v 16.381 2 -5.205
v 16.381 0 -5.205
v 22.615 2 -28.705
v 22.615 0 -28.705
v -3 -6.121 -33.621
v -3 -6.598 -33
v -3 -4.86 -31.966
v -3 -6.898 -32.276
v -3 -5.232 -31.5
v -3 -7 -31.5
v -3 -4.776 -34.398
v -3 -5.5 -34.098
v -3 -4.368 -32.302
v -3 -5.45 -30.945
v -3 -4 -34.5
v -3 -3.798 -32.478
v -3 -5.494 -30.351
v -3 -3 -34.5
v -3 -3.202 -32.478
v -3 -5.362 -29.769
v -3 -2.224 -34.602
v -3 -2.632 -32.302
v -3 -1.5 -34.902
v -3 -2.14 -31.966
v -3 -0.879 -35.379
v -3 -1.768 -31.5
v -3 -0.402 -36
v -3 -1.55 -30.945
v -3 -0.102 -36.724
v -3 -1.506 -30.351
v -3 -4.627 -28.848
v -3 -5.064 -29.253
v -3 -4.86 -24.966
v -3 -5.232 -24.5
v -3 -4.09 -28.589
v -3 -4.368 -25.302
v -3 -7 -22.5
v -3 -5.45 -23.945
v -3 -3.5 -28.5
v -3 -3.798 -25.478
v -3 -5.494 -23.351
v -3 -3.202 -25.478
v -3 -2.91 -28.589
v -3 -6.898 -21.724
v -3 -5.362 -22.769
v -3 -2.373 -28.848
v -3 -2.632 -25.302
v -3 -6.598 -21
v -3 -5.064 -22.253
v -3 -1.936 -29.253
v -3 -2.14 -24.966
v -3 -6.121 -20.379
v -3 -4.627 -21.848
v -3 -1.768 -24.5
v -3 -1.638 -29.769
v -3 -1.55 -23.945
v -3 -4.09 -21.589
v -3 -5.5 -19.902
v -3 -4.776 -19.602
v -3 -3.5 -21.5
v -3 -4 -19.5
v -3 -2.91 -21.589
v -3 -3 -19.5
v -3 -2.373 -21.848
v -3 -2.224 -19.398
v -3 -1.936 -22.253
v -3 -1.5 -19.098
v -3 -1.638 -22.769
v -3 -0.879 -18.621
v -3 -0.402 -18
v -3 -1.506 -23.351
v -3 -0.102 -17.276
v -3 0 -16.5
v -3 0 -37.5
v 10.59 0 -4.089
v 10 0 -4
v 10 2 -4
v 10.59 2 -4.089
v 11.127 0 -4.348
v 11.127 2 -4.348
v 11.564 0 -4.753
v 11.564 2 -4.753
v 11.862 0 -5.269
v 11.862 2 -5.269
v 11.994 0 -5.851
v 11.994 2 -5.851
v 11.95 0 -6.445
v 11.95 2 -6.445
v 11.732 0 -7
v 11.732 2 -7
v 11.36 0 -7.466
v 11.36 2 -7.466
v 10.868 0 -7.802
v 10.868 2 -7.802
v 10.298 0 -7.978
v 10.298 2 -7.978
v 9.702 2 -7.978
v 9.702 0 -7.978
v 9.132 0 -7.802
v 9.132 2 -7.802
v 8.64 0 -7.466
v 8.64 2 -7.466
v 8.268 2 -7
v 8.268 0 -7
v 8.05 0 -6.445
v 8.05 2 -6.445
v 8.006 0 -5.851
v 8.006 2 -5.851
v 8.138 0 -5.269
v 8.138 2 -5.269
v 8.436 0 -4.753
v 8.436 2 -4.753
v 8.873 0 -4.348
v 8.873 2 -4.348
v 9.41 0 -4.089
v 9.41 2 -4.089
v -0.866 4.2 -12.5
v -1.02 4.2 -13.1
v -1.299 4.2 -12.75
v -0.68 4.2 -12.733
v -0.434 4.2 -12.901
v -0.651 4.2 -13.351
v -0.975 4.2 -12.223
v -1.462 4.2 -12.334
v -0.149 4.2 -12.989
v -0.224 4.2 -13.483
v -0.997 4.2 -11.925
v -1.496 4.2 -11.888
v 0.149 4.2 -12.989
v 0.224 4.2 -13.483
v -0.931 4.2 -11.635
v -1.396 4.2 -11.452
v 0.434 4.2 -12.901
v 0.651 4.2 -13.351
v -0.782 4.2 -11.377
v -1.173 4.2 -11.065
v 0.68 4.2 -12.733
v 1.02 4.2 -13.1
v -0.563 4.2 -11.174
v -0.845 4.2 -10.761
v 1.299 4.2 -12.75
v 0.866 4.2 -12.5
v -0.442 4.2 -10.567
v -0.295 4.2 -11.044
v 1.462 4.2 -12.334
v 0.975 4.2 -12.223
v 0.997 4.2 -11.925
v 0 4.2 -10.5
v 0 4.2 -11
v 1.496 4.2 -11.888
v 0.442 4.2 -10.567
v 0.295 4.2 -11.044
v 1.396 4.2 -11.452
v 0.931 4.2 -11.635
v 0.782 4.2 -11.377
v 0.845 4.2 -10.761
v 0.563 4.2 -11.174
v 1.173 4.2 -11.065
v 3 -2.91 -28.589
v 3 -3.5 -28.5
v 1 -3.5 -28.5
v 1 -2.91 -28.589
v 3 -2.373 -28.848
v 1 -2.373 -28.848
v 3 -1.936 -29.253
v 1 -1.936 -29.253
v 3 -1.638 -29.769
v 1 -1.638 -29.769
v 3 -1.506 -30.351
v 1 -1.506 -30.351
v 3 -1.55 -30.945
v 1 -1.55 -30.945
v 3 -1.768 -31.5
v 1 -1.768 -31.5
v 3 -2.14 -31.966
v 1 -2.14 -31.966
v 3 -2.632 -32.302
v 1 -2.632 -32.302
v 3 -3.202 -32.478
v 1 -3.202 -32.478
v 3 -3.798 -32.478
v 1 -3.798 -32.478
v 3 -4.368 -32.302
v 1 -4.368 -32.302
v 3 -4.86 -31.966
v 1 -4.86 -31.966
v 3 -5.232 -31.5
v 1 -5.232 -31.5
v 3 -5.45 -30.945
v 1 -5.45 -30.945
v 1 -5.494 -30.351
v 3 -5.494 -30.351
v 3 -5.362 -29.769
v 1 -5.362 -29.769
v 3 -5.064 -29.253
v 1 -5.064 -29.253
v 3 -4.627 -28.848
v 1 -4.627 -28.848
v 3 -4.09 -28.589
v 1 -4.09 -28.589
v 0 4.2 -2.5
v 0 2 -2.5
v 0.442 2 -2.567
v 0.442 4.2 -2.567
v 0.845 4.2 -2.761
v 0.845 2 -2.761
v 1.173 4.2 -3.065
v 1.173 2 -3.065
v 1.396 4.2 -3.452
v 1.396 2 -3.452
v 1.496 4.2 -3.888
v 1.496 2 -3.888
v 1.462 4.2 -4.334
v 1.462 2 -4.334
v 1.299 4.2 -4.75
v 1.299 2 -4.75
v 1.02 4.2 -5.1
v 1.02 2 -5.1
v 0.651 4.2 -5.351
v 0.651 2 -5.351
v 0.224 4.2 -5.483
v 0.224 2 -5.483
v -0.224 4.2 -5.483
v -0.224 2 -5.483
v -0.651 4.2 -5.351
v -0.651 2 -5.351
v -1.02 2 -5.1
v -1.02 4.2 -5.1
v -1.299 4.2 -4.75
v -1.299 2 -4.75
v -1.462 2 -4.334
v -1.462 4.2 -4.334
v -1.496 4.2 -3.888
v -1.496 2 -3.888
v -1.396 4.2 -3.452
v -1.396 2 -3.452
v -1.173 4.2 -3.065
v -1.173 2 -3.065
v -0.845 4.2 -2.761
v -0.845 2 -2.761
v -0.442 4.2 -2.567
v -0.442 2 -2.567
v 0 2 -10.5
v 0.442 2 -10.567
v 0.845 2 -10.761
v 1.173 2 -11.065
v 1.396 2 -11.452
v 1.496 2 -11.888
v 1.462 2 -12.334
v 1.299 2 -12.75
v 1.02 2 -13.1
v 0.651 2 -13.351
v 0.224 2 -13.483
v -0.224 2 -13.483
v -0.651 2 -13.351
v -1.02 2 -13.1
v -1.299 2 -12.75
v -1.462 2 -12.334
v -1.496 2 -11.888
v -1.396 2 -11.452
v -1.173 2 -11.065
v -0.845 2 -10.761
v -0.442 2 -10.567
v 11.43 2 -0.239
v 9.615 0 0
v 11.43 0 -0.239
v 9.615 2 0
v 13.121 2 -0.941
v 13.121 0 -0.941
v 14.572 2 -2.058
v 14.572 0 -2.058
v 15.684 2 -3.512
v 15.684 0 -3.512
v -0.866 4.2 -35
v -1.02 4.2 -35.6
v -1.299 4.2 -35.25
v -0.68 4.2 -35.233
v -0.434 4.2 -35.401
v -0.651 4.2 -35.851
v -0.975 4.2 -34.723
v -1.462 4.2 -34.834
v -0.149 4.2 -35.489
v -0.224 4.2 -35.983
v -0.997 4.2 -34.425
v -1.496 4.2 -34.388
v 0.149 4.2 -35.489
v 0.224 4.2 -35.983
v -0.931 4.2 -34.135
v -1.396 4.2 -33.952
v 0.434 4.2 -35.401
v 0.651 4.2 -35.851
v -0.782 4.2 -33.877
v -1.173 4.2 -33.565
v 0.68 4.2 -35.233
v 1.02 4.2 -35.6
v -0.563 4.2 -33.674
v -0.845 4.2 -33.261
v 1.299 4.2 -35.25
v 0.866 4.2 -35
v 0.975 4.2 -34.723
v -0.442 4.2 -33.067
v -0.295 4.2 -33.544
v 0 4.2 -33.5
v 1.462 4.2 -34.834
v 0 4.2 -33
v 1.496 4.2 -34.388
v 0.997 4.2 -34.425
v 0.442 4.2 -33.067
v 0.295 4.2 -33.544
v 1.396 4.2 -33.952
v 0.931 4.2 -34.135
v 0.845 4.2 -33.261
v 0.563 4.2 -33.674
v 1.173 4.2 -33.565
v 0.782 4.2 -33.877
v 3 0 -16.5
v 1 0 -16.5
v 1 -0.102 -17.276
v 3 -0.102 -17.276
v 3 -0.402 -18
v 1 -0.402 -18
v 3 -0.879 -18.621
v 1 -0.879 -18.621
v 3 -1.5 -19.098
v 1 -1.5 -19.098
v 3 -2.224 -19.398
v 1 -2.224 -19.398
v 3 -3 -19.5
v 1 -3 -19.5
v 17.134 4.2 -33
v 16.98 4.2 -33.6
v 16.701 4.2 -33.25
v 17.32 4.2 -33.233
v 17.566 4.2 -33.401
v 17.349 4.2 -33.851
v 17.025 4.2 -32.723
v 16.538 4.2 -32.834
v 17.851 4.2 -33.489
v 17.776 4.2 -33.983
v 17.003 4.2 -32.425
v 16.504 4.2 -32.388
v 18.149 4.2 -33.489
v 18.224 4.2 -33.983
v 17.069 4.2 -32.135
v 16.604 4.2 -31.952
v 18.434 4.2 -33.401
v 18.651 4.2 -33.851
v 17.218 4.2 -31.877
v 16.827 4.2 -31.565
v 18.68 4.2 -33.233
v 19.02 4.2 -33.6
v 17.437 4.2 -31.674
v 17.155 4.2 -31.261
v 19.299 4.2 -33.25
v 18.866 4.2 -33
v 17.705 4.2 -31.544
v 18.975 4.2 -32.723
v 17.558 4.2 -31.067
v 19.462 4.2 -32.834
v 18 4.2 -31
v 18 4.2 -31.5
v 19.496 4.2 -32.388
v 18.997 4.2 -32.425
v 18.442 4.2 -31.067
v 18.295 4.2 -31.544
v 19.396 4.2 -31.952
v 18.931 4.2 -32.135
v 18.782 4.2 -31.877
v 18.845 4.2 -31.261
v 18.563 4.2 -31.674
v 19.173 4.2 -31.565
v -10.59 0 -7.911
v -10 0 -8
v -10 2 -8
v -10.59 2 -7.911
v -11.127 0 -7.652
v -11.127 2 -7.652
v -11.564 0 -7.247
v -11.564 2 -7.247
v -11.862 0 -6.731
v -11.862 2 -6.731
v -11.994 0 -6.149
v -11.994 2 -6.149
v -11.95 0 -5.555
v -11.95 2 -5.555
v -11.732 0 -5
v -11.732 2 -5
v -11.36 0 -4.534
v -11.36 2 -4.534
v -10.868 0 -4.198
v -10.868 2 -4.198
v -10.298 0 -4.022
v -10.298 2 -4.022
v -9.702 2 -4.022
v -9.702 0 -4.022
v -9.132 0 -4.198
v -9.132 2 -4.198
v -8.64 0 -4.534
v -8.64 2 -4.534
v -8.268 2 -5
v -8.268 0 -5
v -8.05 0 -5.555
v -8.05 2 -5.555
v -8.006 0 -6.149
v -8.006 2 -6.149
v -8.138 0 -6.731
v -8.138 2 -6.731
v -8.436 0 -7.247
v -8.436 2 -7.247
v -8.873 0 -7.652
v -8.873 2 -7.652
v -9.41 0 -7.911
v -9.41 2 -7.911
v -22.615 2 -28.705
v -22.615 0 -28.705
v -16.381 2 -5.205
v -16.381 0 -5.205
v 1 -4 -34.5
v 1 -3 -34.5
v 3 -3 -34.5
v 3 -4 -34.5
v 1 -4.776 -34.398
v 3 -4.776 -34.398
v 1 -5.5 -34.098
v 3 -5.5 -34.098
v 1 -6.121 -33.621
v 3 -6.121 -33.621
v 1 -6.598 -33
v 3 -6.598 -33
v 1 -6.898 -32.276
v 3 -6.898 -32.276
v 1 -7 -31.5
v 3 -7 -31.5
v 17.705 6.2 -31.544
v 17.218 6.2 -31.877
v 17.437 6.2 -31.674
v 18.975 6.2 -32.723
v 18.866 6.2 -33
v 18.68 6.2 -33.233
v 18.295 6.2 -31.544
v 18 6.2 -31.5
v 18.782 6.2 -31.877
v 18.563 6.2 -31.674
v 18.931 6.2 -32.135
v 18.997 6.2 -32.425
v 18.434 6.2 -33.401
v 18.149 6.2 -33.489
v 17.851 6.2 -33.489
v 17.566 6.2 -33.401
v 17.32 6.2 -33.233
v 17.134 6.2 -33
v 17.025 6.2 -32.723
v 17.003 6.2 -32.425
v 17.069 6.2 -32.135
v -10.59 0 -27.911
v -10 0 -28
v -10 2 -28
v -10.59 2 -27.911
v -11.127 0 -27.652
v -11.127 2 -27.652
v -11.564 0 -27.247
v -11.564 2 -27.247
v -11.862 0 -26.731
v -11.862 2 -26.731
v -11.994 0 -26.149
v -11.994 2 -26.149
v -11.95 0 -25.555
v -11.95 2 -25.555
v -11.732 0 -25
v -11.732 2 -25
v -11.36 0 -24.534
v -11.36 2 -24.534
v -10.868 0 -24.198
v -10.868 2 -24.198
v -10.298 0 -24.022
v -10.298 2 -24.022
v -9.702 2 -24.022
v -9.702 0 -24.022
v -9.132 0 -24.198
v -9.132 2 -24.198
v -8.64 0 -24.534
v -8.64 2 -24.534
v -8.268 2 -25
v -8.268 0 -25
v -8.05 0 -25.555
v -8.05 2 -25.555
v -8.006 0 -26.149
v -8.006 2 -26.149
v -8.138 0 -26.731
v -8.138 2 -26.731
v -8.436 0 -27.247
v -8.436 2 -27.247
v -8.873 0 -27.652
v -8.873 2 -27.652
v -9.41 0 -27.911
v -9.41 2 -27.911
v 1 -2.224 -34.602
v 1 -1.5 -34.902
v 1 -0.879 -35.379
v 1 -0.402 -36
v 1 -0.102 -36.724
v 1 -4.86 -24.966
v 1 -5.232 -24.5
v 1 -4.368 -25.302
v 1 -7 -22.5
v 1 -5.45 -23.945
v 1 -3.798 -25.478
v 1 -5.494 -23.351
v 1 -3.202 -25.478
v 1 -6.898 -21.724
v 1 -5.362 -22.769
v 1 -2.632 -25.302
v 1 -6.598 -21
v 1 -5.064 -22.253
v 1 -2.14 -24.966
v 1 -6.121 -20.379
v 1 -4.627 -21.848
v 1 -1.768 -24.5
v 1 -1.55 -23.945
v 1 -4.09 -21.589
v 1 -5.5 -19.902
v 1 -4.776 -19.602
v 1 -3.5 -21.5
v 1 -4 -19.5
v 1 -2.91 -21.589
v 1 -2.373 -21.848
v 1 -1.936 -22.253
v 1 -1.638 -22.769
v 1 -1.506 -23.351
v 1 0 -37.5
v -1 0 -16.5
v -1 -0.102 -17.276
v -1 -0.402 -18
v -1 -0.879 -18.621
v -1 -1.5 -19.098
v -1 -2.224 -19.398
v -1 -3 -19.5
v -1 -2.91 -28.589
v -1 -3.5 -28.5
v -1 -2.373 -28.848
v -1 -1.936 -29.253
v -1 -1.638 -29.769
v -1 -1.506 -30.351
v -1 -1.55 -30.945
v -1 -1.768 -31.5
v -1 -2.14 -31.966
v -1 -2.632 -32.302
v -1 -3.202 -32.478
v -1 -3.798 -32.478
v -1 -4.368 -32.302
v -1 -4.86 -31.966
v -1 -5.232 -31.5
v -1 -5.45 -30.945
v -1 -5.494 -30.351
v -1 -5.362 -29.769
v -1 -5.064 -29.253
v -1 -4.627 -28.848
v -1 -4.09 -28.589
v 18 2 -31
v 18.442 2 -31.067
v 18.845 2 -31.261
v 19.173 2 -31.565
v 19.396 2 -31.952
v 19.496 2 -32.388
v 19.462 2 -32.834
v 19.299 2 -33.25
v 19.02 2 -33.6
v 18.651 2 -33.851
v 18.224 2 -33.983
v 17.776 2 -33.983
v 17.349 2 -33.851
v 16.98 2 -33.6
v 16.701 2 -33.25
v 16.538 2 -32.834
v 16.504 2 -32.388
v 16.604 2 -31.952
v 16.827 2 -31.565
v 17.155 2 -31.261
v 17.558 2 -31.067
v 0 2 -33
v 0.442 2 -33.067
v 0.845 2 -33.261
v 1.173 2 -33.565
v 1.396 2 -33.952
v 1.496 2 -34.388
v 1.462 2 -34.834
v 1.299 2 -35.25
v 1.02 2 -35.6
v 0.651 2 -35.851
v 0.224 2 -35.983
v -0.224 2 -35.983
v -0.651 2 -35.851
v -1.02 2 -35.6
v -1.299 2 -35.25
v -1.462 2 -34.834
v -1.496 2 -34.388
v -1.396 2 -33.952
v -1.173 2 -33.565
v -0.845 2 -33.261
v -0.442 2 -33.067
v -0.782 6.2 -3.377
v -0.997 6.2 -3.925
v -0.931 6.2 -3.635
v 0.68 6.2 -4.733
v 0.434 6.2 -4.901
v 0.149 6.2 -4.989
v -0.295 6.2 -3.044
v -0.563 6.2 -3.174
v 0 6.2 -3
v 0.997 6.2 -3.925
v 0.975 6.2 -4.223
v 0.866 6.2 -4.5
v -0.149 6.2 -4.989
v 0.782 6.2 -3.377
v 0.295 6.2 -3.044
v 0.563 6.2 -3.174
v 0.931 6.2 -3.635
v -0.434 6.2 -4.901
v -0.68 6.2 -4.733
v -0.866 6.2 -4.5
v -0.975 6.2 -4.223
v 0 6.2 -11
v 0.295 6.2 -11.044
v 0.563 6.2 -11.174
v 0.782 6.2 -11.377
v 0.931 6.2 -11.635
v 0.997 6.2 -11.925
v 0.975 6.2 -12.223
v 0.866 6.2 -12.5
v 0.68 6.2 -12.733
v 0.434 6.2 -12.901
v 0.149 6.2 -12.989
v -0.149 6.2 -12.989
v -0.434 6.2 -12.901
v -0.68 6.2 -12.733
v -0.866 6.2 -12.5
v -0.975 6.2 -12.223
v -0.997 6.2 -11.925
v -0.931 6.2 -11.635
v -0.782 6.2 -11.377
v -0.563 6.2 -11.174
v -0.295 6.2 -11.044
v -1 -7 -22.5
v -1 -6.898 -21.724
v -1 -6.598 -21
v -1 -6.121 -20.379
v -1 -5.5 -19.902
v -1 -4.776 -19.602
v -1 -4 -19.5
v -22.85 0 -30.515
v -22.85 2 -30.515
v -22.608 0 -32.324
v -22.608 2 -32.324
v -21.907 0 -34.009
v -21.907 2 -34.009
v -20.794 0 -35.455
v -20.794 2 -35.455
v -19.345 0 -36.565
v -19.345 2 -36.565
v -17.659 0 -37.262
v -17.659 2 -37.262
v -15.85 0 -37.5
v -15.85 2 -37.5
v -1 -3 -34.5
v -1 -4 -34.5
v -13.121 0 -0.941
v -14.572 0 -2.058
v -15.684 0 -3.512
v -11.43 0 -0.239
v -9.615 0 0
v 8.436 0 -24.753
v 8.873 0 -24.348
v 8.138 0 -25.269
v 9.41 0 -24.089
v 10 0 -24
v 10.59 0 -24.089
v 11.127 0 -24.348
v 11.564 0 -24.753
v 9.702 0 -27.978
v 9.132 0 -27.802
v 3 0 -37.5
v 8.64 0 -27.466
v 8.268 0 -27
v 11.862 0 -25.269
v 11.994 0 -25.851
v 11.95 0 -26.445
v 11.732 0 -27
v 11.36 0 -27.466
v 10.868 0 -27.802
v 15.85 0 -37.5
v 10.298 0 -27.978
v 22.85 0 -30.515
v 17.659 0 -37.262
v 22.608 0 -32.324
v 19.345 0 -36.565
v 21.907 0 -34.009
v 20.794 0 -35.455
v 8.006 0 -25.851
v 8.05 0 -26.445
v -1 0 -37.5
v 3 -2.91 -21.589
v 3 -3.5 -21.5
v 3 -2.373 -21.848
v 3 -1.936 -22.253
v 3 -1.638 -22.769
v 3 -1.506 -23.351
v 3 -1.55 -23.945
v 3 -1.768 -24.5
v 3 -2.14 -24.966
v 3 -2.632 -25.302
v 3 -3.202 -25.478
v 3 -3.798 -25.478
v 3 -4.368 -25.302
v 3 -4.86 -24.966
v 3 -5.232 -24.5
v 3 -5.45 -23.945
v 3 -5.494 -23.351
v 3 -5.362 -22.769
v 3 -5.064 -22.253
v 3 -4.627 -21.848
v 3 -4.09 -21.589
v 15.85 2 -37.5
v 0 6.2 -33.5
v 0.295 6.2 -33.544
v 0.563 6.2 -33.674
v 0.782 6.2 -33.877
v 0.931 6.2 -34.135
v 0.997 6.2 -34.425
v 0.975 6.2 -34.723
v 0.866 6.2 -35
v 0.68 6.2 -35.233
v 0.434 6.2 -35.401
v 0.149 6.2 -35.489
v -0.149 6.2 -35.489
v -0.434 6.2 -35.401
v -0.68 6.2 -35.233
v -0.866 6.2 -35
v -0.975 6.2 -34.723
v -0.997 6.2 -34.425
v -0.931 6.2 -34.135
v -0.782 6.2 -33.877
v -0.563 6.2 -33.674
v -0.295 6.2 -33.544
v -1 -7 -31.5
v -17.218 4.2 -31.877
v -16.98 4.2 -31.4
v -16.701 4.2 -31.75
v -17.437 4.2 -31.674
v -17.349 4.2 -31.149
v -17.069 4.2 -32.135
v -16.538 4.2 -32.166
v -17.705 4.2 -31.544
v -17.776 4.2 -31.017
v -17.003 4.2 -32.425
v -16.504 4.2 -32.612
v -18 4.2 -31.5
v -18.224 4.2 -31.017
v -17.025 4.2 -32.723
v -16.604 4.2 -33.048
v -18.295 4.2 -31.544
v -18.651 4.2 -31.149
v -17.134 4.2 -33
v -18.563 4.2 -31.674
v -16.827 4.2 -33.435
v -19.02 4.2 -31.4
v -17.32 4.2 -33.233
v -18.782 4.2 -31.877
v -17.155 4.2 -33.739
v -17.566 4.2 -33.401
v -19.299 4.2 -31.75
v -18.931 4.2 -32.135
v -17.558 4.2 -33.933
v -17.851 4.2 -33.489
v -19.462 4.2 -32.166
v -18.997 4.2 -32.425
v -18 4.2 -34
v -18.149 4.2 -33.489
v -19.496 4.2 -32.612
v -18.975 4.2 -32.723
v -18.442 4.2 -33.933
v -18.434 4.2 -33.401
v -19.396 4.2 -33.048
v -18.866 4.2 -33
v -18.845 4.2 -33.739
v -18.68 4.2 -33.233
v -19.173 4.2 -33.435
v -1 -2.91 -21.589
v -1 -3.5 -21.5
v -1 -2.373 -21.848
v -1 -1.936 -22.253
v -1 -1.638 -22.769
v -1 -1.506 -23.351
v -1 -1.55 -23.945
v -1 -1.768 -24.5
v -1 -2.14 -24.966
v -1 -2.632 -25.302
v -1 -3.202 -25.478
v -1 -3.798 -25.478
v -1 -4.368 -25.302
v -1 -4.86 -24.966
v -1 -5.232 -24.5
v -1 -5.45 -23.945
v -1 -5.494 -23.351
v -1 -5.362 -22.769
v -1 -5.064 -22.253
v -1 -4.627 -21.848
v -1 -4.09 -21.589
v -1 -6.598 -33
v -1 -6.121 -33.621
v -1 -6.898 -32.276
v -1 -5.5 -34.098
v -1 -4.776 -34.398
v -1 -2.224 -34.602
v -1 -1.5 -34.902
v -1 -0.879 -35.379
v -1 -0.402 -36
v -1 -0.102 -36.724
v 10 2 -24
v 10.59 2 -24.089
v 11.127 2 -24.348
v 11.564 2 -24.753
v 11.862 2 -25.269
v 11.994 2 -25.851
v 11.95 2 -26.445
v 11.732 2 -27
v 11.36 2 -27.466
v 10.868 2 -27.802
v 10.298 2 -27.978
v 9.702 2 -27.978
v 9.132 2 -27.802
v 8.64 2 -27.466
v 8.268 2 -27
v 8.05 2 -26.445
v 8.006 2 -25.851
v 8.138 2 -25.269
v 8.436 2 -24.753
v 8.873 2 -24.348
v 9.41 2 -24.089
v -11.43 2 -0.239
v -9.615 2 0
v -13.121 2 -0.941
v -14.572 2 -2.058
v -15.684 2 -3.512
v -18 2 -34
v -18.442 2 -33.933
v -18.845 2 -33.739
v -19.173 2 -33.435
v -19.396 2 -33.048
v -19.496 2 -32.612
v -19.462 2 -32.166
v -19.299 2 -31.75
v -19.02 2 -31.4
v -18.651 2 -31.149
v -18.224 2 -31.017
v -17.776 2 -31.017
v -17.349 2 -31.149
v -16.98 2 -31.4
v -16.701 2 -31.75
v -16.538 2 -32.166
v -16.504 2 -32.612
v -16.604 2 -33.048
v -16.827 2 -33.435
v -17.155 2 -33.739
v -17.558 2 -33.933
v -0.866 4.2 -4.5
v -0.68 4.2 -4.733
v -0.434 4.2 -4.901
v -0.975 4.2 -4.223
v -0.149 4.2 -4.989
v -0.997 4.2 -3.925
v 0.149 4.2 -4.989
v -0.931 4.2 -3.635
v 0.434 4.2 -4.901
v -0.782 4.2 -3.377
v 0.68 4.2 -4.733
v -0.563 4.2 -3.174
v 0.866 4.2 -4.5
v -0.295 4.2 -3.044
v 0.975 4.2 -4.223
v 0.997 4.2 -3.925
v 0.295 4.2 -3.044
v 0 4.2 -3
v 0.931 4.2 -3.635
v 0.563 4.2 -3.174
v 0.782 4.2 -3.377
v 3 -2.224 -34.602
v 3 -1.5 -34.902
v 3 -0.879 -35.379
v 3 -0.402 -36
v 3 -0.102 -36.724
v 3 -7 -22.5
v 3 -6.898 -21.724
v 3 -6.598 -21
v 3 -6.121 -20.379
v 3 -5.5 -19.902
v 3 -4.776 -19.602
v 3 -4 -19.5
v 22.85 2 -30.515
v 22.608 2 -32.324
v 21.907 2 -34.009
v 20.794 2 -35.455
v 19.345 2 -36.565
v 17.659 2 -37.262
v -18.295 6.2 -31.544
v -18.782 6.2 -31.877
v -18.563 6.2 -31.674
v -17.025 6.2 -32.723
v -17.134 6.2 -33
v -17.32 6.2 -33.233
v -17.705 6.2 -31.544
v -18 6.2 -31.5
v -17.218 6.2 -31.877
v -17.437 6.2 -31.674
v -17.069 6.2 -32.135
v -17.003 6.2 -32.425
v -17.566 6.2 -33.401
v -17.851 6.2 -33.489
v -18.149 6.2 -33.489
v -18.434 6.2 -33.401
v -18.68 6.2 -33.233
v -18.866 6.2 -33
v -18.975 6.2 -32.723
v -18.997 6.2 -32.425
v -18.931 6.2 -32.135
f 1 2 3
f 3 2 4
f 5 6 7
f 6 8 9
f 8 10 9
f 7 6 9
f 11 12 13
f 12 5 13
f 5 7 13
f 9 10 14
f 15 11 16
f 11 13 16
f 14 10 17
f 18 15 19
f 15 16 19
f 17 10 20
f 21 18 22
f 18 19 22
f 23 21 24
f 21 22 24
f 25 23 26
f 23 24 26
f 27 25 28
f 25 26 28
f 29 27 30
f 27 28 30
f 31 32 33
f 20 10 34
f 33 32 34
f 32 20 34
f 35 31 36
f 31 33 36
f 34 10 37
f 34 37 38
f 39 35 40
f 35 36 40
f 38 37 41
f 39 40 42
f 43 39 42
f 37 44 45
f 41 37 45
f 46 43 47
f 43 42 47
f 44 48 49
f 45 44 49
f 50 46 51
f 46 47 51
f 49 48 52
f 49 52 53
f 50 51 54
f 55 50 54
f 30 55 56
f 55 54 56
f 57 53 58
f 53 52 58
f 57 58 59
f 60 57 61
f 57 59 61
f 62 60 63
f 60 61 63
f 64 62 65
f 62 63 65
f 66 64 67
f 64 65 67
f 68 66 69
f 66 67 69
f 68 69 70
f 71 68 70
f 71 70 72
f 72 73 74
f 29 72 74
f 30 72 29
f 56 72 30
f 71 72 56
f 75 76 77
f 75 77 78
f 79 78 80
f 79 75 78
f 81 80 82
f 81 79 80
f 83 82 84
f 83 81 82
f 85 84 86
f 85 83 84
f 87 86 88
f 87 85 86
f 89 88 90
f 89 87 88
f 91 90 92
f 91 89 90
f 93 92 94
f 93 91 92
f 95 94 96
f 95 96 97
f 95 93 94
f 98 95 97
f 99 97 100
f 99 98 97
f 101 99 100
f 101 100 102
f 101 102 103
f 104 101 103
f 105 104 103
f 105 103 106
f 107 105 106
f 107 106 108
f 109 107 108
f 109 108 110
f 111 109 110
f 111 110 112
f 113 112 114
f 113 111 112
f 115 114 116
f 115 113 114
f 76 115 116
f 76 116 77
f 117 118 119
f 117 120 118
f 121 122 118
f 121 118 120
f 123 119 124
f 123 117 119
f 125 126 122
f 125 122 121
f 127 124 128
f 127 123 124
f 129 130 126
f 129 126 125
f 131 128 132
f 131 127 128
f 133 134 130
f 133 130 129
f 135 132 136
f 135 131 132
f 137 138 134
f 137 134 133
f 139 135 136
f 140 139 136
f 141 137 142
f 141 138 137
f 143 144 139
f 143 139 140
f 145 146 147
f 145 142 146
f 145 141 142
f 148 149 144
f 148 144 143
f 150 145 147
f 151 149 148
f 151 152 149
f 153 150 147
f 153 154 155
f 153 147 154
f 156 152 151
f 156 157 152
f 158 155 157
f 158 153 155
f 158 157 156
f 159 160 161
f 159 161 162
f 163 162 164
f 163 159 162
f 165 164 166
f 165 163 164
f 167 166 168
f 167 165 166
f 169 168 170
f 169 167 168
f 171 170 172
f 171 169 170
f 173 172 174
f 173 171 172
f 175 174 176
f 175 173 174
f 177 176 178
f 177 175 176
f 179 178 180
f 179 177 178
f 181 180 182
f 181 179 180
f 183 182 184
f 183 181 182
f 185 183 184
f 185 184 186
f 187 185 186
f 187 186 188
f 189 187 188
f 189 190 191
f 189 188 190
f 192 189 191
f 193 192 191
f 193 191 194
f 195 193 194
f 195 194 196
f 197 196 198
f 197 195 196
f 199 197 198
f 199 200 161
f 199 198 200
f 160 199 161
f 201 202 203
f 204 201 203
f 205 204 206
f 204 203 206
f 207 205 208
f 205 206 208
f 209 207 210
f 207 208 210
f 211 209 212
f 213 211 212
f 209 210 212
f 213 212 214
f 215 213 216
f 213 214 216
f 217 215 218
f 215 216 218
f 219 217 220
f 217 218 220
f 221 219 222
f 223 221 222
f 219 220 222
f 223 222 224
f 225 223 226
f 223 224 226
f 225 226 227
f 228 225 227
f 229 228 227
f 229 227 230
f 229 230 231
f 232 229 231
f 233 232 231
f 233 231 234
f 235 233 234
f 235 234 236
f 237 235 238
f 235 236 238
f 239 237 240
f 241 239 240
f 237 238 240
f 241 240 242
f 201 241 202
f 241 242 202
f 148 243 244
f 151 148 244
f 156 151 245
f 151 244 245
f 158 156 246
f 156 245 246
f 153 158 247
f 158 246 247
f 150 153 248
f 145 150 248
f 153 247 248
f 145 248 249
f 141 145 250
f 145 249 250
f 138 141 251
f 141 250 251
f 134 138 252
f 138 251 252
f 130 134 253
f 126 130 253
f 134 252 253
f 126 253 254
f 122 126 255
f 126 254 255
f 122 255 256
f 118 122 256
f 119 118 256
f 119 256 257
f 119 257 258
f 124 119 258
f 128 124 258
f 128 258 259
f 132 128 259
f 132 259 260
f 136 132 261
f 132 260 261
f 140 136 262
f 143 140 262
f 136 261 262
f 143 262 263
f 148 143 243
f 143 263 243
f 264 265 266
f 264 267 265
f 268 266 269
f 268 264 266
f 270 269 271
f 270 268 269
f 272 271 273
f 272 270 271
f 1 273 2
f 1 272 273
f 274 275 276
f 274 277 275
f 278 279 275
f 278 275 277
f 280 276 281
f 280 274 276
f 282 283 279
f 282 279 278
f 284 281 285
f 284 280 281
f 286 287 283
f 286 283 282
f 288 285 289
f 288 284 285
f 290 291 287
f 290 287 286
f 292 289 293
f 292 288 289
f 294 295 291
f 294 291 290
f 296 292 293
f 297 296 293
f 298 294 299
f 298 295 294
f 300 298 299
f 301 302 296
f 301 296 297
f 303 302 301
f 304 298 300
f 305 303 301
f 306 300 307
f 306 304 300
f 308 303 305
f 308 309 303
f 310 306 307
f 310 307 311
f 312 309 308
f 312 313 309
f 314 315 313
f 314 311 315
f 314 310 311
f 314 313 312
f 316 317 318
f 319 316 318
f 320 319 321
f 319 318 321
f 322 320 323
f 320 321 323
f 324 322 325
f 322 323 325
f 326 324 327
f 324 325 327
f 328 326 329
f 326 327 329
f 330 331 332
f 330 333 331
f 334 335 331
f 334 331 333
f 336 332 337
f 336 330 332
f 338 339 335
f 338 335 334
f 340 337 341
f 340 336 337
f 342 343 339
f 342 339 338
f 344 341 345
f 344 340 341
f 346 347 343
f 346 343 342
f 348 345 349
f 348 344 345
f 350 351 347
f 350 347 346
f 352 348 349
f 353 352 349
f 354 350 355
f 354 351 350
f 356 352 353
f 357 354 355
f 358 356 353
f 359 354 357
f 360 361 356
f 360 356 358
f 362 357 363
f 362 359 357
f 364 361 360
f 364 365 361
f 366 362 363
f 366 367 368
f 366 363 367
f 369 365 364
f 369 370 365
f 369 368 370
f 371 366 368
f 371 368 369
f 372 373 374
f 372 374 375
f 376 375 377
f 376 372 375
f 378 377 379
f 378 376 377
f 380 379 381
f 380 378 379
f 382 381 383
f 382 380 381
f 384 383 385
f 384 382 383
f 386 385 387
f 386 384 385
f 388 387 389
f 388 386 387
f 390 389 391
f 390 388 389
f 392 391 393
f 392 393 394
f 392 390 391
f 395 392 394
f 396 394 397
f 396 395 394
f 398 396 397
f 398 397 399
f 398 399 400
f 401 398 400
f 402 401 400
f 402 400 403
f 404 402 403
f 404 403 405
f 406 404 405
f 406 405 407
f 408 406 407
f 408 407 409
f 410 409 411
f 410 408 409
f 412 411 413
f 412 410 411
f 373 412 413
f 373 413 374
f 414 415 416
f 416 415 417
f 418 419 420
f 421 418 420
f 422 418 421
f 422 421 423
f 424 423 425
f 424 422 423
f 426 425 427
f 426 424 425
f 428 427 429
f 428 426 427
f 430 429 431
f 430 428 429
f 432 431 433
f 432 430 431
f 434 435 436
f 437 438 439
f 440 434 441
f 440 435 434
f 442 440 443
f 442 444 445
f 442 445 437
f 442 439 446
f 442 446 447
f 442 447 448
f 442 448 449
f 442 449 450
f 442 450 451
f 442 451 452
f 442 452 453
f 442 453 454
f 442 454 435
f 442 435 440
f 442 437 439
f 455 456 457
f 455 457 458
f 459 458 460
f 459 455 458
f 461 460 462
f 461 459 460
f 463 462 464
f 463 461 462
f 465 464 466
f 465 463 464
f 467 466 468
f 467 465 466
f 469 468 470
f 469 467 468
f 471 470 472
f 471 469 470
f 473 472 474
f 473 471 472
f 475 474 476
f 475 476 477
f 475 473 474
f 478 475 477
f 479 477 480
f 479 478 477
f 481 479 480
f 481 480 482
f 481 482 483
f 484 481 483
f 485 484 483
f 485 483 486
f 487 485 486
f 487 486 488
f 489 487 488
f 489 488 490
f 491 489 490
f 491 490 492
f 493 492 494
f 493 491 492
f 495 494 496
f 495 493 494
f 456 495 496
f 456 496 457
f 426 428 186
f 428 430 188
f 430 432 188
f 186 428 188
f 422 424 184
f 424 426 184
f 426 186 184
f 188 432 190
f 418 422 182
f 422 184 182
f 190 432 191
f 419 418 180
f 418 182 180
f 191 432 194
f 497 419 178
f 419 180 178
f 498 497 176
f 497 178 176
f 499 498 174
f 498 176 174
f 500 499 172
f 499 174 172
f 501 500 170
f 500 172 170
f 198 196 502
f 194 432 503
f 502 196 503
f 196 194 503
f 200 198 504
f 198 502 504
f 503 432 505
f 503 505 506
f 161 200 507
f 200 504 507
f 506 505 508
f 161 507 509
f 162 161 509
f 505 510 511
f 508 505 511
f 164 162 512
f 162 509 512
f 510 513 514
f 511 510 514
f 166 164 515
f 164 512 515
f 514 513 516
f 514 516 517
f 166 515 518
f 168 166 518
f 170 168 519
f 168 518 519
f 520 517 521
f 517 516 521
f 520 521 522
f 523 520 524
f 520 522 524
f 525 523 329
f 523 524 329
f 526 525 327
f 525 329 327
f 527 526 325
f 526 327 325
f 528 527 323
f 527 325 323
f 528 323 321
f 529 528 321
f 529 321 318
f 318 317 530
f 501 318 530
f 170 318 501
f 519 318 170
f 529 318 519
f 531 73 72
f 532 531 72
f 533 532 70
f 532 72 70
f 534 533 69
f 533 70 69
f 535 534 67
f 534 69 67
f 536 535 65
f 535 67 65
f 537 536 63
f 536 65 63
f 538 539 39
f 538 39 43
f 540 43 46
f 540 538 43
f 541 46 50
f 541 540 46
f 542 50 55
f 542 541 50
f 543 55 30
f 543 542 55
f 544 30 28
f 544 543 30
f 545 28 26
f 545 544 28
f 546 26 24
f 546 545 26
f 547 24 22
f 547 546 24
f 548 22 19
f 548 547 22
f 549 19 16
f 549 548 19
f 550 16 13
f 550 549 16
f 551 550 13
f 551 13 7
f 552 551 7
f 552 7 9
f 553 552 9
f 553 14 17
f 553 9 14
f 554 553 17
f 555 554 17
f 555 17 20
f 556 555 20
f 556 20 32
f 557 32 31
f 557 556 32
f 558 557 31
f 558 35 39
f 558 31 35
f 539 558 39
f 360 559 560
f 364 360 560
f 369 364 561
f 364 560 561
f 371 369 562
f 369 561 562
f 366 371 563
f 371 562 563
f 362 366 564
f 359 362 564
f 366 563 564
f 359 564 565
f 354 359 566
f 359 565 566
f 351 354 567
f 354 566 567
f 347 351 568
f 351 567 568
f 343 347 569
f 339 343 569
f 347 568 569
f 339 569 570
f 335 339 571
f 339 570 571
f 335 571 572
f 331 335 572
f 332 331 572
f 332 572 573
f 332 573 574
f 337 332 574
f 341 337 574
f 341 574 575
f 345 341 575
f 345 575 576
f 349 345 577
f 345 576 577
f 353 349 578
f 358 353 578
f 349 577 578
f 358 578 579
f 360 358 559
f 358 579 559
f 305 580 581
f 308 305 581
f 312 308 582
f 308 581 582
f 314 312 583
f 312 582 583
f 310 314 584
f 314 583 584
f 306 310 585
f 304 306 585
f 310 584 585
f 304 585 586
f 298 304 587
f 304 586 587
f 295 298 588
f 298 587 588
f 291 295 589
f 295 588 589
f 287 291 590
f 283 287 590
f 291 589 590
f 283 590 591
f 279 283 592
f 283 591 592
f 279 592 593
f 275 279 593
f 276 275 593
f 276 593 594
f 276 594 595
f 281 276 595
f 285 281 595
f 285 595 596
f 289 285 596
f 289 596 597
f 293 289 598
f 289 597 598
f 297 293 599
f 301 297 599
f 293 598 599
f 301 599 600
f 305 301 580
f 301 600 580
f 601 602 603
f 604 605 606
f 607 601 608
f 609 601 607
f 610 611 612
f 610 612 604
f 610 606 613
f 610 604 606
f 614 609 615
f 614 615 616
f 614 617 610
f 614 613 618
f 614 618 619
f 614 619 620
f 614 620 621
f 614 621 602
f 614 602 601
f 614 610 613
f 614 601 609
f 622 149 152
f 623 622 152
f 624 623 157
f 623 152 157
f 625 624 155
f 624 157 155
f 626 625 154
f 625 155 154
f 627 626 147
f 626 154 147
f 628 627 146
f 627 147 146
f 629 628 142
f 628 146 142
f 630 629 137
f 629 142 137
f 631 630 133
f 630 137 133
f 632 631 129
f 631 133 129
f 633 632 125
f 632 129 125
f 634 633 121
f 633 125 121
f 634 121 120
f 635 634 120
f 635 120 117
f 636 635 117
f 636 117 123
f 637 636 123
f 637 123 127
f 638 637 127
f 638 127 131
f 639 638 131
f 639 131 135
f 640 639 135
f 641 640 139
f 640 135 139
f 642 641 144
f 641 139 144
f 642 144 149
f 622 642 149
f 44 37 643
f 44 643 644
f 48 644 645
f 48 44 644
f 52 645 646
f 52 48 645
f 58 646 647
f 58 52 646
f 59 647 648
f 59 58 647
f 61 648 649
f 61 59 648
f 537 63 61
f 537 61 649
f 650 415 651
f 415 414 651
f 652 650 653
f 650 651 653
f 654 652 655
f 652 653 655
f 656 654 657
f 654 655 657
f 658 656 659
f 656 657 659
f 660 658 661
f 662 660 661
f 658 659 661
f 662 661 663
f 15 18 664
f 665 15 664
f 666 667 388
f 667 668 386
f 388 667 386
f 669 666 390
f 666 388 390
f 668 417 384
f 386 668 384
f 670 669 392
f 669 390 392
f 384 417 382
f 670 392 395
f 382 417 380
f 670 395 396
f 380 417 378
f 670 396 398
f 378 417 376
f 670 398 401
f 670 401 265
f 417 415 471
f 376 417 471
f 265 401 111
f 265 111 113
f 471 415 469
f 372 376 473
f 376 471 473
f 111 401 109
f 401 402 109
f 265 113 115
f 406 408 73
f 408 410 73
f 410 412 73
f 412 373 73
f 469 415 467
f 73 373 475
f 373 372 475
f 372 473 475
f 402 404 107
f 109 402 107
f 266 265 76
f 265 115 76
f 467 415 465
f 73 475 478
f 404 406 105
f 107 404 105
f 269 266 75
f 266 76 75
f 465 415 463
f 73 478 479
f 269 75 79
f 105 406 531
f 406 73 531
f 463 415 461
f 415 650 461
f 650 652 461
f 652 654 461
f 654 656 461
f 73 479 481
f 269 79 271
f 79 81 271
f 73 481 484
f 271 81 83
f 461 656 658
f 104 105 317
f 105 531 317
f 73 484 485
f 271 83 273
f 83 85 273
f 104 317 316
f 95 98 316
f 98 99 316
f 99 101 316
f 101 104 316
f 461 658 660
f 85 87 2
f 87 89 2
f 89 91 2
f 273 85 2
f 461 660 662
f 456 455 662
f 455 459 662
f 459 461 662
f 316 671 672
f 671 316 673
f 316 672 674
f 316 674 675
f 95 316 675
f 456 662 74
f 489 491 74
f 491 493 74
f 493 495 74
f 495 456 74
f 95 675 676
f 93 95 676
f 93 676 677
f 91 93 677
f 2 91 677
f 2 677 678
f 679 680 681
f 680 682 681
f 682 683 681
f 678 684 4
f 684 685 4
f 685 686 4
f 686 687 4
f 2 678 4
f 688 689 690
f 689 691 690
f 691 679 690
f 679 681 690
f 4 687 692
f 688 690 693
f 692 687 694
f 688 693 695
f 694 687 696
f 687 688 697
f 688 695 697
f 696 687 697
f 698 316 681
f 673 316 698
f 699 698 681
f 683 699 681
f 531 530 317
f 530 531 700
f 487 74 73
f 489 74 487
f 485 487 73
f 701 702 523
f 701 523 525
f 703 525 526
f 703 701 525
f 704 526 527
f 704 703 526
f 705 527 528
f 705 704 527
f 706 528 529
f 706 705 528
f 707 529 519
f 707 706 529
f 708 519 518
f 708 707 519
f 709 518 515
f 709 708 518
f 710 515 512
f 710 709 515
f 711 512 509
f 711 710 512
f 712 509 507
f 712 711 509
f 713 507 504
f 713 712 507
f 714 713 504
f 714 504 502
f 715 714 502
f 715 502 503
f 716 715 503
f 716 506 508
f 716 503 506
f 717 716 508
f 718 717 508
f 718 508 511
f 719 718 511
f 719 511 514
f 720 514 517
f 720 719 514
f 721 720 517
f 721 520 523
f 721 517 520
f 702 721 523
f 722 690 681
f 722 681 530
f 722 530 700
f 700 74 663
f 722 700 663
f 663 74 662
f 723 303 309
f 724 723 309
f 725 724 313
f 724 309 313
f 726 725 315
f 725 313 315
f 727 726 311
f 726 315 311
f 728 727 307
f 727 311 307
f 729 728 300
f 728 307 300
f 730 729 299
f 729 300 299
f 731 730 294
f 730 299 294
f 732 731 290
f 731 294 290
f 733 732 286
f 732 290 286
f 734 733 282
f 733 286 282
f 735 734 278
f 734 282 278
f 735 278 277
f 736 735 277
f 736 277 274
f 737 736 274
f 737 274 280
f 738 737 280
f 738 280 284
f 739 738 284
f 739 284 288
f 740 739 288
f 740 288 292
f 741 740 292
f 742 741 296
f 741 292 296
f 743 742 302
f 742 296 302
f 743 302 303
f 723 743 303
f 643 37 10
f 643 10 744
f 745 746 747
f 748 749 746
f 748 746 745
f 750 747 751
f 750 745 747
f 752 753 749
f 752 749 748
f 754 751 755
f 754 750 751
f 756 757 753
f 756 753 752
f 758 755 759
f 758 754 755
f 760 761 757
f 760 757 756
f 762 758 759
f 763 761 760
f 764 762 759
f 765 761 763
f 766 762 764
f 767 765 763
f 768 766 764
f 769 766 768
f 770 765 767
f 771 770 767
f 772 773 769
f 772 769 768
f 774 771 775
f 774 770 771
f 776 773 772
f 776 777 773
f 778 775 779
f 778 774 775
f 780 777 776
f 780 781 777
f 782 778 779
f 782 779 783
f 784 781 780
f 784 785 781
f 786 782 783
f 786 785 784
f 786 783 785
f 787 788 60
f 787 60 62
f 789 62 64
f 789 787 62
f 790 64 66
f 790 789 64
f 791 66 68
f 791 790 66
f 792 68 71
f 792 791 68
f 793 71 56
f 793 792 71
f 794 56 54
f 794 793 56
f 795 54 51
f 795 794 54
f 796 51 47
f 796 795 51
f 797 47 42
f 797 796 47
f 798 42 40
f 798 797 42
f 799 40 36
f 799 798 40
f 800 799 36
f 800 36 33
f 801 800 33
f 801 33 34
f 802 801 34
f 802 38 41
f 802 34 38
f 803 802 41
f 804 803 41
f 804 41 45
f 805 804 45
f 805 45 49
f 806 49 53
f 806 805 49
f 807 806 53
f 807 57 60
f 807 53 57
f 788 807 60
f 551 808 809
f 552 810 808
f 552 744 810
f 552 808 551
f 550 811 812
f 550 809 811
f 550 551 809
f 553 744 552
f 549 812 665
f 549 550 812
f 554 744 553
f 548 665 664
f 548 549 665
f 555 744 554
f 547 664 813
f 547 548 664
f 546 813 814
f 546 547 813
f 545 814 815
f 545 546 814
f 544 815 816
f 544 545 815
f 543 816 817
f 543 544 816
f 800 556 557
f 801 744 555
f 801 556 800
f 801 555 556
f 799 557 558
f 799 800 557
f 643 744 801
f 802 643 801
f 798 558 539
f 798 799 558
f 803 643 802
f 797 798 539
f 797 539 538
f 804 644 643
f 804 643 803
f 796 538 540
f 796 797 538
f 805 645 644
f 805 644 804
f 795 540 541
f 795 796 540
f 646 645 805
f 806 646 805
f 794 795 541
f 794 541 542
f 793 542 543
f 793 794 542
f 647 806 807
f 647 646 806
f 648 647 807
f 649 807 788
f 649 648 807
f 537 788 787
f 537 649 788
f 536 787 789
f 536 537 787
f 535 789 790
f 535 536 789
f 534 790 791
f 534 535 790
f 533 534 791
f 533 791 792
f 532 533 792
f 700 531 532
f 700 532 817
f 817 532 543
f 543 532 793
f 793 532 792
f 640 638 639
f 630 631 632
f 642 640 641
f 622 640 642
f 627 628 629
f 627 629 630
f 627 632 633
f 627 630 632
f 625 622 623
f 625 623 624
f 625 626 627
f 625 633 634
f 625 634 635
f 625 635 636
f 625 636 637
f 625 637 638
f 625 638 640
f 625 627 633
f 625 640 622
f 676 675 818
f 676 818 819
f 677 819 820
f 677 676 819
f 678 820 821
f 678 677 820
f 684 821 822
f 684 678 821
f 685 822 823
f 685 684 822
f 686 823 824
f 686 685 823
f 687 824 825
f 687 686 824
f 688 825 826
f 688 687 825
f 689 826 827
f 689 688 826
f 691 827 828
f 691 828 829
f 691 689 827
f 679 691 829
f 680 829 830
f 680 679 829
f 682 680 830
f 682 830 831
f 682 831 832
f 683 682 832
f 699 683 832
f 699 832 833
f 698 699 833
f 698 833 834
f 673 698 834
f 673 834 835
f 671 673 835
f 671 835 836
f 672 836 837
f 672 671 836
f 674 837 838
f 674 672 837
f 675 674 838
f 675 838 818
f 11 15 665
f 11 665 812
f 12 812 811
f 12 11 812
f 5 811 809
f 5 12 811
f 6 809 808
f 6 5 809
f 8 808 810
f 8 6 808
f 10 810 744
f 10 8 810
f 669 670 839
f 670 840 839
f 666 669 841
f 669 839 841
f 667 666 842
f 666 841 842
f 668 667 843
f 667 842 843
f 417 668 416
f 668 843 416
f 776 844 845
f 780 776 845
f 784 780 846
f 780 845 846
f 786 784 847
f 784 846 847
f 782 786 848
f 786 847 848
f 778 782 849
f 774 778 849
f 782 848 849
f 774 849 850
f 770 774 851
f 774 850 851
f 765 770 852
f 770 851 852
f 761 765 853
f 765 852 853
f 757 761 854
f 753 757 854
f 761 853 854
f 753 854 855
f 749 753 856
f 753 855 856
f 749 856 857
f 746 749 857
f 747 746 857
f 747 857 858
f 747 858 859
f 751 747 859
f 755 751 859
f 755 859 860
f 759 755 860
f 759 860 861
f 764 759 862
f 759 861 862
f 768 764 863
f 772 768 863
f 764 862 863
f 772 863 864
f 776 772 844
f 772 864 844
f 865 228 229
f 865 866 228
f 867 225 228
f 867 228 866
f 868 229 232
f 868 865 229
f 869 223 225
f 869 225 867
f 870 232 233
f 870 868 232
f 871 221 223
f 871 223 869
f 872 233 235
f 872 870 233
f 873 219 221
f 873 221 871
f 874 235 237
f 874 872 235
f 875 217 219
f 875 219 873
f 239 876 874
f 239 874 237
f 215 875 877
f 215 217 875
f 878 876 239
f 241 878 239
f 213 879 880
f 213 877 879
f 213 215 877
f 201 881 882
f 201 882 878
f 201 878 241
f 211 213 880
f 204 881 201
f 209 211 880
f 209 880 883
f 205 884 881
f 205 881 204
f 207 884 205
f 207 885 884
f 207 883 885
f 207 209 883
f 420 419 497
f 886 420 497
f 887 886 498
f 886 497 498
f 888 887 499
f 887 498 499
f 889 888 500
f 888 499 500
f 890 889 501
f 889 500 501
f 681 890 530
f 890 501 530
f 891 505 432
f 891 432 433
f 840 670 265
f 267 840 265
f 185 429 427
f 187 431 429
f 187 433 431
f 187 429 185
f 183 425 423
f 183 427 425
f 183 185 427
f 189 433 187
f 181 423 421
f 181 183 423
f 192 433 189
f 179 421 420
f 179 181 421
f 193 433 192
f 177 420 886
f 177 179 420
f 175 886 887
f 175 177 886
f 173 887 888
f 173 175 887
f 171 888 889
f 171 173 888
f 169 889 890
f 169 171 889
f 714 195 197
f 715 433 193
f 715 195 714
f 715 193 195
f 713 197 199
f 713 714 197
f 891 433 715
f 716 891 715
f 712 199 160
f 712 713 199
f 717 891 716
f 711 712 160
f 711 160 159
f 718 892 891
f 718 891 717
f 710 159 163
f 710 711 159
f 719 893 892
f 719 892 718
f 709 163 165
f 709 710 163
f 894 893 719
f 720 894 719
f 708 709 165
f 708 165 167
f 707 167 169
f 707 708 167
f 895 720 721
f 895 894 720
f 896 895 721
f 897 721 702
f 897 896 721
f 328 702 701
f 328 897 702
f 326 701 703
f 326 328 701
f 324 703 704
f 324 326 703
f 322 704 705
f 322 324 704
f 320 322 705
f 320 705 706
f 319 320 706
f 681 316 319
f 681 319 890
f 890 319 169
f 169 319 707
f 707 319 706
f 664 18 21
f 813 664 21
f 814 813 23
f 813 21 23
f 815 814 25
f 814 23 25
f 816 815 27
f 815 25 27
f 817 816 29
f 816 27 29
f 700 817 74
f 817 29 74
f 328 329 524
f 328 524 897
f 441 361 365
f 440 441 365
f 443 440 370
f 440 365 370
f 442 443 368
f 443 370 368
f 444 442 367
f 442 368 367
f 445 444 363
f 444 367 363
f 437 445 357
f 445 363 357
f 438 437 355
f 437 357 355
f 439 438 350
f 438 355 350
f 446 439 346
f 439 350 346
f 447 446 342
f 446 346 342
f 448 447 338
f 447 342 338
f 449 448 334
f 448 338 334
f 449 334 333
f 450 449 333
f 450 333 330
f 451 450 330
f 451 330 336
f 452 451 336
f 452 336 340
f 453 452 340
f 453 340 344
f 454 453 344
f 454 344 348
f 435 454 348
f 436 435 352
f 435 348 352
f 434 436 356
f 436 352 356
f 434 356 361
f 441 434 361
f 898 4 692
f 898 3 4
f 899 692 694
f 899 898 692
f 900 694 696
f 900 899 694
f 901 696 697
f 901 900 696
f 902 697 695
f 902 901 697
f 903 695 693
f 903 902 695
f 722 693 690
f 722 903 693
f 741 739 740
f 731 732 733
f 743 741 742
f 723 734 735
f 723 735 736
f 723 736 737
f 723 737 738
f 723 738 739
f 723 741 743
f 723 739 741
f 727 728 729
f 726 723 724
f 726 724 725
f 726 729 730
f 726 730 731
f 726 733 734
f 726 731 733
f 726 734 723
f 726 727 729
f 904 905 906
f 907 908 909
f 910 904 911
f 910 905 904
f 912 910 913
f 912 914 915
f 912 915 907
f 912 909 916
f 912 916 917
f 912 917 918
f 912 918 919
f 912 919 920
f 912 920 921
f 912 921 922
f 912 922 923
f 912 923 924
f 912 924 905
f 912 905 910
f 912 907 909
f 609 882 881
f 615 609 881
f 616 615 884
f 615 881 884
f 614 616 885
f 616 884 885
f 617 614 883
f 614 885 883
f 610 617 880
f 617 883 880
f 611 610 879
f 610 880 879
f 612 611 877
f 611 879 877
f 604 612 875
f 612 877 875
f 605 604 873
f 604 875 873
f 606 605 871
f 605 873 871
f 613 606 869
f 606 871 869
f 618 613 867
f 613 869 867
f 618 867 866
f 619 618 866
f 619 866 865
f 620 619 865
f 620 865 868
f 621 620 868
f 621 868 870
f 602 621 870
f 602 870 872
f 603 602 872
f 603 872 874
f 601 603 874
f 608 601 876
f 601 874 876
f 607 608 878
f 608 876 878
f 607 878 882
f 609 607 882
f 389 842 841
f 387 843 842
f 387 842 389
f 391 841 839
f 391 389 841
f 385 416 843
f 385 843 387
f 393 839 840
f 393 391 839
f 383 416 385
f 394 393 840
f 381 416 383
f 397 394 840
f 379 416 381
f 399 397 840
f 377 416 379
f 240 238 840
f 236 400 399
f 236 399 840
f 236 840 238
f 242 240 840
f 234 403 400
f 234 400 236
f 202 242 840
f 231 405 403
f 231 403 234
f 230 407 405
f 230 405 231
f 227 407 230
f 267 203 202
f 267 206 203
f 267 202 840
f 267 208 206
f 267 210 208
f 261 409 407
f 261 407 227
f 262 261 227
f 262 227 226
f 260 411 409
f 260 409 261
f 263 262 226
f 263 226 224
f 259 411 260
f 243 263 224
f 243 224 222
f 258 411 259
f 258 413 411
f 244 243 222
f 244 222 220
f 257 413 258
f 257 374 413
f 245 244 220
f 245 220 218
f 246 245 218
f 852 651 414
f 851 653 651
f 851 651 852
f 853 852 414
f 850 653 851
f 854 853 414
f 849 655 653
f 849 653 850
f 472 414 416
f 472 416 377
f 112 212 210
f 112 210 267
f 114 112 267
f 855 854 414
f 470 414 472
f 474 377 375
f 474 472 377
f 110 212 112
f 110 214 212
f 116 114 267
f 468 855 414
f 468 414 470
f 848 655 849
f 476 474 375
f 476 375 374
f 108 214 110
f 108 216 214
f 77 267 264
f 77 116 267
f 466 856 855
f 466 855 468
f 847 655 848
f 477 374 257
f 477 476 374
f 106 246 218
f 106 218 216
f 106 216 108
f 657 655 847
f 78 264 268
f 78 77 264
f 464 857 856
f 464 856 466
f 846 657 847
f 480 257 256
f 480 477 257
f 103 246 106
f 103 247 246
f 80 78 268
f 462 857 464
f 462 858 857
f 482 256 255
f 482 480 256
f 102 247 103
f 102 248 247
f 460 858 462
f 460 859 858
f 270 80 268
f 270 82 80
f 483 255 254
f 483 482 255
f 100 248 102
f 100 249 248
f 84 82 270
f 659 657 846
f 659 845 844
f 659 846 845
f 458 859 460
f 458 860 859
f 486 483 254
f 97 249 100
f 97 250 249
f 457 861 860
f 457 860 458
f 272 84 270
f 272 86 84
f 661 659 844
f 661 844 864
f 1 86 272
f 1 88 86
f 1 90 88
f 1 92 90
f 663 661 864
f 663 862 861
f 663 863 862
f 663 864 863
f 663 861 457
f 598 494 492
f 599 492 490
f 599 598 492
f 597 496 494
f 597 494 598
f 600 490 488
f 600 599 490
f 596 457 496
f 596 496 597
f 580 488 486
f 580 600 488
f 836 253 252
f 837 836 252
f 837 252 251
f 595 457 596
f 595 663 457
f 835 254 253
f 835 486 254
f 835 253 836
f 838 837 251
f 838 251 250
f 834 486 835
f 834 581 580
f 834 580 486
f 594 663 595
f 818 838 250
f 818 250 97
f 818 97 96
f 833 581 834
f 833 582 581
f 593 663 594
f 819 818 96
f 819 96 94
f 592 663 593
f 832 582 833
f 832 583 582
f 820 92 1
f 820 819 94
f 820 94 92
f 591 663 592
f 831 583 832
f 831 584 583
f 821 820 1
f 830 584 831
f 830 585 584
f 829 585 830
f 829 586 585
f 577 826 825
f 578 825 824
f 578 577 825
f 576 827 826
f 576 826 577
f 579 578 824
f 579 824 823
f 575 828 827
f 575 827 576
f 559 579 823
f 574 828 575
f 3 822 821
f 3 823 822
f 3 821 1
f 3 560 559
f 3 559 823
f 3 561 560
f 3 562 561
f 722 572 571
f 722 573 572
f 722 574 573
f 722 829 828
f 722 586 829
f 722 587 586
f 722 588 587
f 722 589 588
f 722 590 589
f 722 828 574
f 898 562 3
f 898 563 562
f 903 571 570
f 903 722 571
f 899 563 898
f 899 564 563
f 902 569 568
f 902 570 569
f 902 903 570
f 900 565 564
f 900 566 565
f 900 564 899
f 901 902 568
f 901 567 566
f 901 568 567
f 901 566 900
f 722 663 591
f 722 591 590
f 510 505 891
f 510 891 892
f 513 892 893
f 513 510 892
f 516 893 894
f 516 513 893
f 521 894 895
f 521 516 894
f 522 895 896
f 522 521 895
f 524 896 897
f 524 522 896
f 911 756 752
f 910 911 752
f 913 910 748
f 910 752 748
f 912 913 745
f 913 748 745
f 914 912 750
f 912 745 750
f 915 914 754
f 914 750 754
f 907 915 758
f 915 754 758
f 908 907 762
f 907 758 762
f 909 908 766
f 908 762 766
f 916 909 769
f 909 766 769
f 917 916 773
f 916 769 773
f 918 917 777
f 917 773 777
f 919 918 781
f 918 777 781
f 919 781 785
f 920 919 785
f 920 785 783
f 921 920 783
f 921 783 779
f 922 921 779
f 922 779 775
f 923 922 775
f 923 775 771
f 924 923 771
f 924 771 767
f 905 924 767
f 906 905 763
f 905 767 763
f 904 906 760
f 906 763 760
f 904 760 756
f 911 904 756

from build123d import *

# Parameters (mm, degrees)
SKETCH1_R               = 2
BOSS_EXTRUDE1_DEPTH     = 2
FILLET1_R               = 7
SKETCH2_R               = 1.5
BOSS_EXTRUDE2_DEPTH     = 2.2
SKETCH3_R               = 1
BOSS_EXTRUDE3_DEPTH     = 2
SKETCH4_W               = 2
SKETCH4_H               = 15
BOSS_EXTRUDE4_DEPTH     = 7
FILLET3_START           = -3
FILLET3_DEPTH           = 6
FILLET3_2_DEPTH         = 2
FILLET3_START_2         = 1
FILLET3_3_DEPTH         = 2
CUT_EXTRUDE1_DEPTH      = 47.08088663
CUT_EXTRUDE1_DEPTH_BACK = 47.08088663
SKETCH5_R               = 2


with BuildPart() as part:
    # Sketch1 → Boss-Extrude1 (new body)
    with BuildSketch(Plane(origin=(0, 0, 0), x_dir=(1, 0, 0), z_dir=(0, 1, 0))):
        Polygon((-15, 0), (15, 0), (24.948794511, 37.5), (-24.948794511, 37.5), align=None)
        with Locations(Location((10, 26, 0), (0, 0, 270))):
            Circle(SKETCH1_R, mode=Mode.SUBTRACT)
        with Locations(Location((10, 6, 0), (0, 0, 270))):
            Circle(SKETCH1_R, mode=Mode.SUBTRACT)
        with Locations(Location((-10, 6, 0), (0, 0, 90))):
            Circle(SKETCH1_R, mode=Mode.SUBTRACT)
        with Locations(Location((-10, 26, 0), (0, 0, 90))):
            Circle(SKETCH1_R, mode=Mode.SUBTRACT)
    extrude(amount=BOSS_EXTRUDE1_DEPTH)

    # Fillet1
    fillet1_edges = [part.edges().sort_by_distance(p)[0] for p in [
        (-24.948794511, 1, -37.5),
        (24.948794511, 1, -37.5),
        (15, 1, 0),
        (-15, 1, 0),
    ]]
    fillet(fillet1_edges, radius=FILLET1_R)

    # Sketch2 → Boss-Extrude2 (add)
    with BuildSketch(Plane(origin=(0, 2, 0), x_dir=(1, 0, 0), z_dir=(0, 1, 0))):
        with Locations(Location((0, 34.5, 0), (0, 0, 270))):
            Circle(SKETCH2_R)
        with Locations(Location((18, 32.5, 0), (0, 0, 270))):
            Circle(SKETCH2_R)
        with Locations(Location((0, 4, 0), (0, 0, 270))):
            Circle(SKETCH2_R)
        with Locations(Location((0, 12, 0), (0, 0, 270))):
            Circle(SKETCH2_R)
        with Locations(Location((-18, 32.5, 0), (0, 0, 90))):
            Circle(SKETCH2_R)
    extrude(amount=BOSS_EXTRUDE2_DEPTH)

    # Sketch3 → Boss-Extrude3 (add)
    with BuildSketch(Plane(origin=(0, 4.2, 0), x_dir=(1, 0, 0), z_dir=(0, 1, 0))):
        with Locations(Location((-18, 32.5, 0), (0, 0, 270))):
            Circle(SKETCH3_R)
        with Locations(Location((0, 34.5, 0), (0, 0, 270))):
            Circle(SKETCH3_R)
        with Locations(Location((18, 32.5, 0), (0, 0, 270))):
            Circle(SKETCH3_R)
        with Locations(Location((0, 12, 0), (0, 0, 270))):
            Circle(SKETCH3_R)
        with Locations(Location((0, 4, 0), (0, 0, 270))):
            Circle(SKETCH3_R)
    extrude(amount=BOSS_EXTRUDE3_DEPTH)

    # Sketch4 → Boss-Extrude4 (add)
    with BuildSketch(Plane.XZ):
        with Locations((-2, -27)):
            Rectangle(SKETCH4_W, SKETCH4_H)
        with Locations((2, -27)):
            Rectangle(SKETCH4_W, SKETCH4_H)
    extrude(amount=BOSS_EXTRUDE4_DEPTH)

    # Fillet3: read off the stored shape, not the designer's step
    # Fillet3 outline → Fillet3 (cut)
    with BuildSketch(Plane.YZ.offset(FILLET3_START)):
        with BuildLine():
            Line((-7, -34.5), (-4, -34.5))
            ThreePointArc((-4, -34.5), (-6.121320344, -33.621320344), (-7, -31.5))
            Line((-7, -31.5), (-7, -34.5))
        make_face()
        with BuildLine():
            Line((-7, -19.5), (-7, -22.5))
            ThreePointArc((-7, -22.5), (-6.121320344, -20.378679656), (-4, -19.5))
            Line((-4, -19.5), (-7, -19.5))
        make_face()
    extrude(amount=FILLET3_DEPTH, mode=Mode.SUBTRACT)

    # Fillet3 2 outline → Fillet3 2 (add)
    with BuildSketch(Plane.YZ.offset(FILLET3_START)):
        with BuildLine():
            Line((0, -34.5), (-3, -34.5))
            ThreePointArc((-3, -34.5), (-0.878679656, -35.378679656), (0, -37.5))
            Line((0, -37.5), (0, -34.5))
        make_face()
        with BuildLine():
            Line((-3, -19.5), (0, -19.5))
            Line((0, -19.5), (0, -16.5))
            ThreePointArc((0, -16.5), (-0.878679656, -18.621320344), (-3, -19.5))
        make_face()
    extrude(amount=FILLET3_2_DEPTH)

    # Fillet3 3 outline → Fillet3 3 (add)
    with BuildSketch(Plane.YZ.offset(FILLET3_START_2)):
        with BuildLine():
            Line((0, -34.5), (-3, -34.5))
            ThreePointArc((-3, -34.5), (-0.878679656, -35.378679656), (0, -37.5))
            Line((0, -37.5), (0, -34.5))
        make_face()
        with BuildLine():
            Line((-3, -19.5), (0, -19.5))
            Line((0, -19.5), (0, -16.5))
            ThreePointArc((0, -16.5), (-0.878679656, -18.621320344), (-3, -19.5))
        make_face()
    extrude(amount=FILLET3_3_DEPTH)

    # Sketch5 → Cut-Extrude1 (cut, two sides: drawn at the far end of the back side and taken through both)
    with BuildSketch(Plane.ZY.offset(3).offset(-CUT_EXTRUDE1_DEPTH_BACK)):
        with Locations((-30.5, -3.5)):
            Circle(SKETCH5_R)
        with Locations((-23.5, -3.5)):
            Circle(SKETCH5_R)
    extrude(amount=CUT_EXTRUDE1_DEPTH + CUT_EXTRUDE1_DEPTH_BACK, mode=Mode.SUBTRACT)


solid = part.part
